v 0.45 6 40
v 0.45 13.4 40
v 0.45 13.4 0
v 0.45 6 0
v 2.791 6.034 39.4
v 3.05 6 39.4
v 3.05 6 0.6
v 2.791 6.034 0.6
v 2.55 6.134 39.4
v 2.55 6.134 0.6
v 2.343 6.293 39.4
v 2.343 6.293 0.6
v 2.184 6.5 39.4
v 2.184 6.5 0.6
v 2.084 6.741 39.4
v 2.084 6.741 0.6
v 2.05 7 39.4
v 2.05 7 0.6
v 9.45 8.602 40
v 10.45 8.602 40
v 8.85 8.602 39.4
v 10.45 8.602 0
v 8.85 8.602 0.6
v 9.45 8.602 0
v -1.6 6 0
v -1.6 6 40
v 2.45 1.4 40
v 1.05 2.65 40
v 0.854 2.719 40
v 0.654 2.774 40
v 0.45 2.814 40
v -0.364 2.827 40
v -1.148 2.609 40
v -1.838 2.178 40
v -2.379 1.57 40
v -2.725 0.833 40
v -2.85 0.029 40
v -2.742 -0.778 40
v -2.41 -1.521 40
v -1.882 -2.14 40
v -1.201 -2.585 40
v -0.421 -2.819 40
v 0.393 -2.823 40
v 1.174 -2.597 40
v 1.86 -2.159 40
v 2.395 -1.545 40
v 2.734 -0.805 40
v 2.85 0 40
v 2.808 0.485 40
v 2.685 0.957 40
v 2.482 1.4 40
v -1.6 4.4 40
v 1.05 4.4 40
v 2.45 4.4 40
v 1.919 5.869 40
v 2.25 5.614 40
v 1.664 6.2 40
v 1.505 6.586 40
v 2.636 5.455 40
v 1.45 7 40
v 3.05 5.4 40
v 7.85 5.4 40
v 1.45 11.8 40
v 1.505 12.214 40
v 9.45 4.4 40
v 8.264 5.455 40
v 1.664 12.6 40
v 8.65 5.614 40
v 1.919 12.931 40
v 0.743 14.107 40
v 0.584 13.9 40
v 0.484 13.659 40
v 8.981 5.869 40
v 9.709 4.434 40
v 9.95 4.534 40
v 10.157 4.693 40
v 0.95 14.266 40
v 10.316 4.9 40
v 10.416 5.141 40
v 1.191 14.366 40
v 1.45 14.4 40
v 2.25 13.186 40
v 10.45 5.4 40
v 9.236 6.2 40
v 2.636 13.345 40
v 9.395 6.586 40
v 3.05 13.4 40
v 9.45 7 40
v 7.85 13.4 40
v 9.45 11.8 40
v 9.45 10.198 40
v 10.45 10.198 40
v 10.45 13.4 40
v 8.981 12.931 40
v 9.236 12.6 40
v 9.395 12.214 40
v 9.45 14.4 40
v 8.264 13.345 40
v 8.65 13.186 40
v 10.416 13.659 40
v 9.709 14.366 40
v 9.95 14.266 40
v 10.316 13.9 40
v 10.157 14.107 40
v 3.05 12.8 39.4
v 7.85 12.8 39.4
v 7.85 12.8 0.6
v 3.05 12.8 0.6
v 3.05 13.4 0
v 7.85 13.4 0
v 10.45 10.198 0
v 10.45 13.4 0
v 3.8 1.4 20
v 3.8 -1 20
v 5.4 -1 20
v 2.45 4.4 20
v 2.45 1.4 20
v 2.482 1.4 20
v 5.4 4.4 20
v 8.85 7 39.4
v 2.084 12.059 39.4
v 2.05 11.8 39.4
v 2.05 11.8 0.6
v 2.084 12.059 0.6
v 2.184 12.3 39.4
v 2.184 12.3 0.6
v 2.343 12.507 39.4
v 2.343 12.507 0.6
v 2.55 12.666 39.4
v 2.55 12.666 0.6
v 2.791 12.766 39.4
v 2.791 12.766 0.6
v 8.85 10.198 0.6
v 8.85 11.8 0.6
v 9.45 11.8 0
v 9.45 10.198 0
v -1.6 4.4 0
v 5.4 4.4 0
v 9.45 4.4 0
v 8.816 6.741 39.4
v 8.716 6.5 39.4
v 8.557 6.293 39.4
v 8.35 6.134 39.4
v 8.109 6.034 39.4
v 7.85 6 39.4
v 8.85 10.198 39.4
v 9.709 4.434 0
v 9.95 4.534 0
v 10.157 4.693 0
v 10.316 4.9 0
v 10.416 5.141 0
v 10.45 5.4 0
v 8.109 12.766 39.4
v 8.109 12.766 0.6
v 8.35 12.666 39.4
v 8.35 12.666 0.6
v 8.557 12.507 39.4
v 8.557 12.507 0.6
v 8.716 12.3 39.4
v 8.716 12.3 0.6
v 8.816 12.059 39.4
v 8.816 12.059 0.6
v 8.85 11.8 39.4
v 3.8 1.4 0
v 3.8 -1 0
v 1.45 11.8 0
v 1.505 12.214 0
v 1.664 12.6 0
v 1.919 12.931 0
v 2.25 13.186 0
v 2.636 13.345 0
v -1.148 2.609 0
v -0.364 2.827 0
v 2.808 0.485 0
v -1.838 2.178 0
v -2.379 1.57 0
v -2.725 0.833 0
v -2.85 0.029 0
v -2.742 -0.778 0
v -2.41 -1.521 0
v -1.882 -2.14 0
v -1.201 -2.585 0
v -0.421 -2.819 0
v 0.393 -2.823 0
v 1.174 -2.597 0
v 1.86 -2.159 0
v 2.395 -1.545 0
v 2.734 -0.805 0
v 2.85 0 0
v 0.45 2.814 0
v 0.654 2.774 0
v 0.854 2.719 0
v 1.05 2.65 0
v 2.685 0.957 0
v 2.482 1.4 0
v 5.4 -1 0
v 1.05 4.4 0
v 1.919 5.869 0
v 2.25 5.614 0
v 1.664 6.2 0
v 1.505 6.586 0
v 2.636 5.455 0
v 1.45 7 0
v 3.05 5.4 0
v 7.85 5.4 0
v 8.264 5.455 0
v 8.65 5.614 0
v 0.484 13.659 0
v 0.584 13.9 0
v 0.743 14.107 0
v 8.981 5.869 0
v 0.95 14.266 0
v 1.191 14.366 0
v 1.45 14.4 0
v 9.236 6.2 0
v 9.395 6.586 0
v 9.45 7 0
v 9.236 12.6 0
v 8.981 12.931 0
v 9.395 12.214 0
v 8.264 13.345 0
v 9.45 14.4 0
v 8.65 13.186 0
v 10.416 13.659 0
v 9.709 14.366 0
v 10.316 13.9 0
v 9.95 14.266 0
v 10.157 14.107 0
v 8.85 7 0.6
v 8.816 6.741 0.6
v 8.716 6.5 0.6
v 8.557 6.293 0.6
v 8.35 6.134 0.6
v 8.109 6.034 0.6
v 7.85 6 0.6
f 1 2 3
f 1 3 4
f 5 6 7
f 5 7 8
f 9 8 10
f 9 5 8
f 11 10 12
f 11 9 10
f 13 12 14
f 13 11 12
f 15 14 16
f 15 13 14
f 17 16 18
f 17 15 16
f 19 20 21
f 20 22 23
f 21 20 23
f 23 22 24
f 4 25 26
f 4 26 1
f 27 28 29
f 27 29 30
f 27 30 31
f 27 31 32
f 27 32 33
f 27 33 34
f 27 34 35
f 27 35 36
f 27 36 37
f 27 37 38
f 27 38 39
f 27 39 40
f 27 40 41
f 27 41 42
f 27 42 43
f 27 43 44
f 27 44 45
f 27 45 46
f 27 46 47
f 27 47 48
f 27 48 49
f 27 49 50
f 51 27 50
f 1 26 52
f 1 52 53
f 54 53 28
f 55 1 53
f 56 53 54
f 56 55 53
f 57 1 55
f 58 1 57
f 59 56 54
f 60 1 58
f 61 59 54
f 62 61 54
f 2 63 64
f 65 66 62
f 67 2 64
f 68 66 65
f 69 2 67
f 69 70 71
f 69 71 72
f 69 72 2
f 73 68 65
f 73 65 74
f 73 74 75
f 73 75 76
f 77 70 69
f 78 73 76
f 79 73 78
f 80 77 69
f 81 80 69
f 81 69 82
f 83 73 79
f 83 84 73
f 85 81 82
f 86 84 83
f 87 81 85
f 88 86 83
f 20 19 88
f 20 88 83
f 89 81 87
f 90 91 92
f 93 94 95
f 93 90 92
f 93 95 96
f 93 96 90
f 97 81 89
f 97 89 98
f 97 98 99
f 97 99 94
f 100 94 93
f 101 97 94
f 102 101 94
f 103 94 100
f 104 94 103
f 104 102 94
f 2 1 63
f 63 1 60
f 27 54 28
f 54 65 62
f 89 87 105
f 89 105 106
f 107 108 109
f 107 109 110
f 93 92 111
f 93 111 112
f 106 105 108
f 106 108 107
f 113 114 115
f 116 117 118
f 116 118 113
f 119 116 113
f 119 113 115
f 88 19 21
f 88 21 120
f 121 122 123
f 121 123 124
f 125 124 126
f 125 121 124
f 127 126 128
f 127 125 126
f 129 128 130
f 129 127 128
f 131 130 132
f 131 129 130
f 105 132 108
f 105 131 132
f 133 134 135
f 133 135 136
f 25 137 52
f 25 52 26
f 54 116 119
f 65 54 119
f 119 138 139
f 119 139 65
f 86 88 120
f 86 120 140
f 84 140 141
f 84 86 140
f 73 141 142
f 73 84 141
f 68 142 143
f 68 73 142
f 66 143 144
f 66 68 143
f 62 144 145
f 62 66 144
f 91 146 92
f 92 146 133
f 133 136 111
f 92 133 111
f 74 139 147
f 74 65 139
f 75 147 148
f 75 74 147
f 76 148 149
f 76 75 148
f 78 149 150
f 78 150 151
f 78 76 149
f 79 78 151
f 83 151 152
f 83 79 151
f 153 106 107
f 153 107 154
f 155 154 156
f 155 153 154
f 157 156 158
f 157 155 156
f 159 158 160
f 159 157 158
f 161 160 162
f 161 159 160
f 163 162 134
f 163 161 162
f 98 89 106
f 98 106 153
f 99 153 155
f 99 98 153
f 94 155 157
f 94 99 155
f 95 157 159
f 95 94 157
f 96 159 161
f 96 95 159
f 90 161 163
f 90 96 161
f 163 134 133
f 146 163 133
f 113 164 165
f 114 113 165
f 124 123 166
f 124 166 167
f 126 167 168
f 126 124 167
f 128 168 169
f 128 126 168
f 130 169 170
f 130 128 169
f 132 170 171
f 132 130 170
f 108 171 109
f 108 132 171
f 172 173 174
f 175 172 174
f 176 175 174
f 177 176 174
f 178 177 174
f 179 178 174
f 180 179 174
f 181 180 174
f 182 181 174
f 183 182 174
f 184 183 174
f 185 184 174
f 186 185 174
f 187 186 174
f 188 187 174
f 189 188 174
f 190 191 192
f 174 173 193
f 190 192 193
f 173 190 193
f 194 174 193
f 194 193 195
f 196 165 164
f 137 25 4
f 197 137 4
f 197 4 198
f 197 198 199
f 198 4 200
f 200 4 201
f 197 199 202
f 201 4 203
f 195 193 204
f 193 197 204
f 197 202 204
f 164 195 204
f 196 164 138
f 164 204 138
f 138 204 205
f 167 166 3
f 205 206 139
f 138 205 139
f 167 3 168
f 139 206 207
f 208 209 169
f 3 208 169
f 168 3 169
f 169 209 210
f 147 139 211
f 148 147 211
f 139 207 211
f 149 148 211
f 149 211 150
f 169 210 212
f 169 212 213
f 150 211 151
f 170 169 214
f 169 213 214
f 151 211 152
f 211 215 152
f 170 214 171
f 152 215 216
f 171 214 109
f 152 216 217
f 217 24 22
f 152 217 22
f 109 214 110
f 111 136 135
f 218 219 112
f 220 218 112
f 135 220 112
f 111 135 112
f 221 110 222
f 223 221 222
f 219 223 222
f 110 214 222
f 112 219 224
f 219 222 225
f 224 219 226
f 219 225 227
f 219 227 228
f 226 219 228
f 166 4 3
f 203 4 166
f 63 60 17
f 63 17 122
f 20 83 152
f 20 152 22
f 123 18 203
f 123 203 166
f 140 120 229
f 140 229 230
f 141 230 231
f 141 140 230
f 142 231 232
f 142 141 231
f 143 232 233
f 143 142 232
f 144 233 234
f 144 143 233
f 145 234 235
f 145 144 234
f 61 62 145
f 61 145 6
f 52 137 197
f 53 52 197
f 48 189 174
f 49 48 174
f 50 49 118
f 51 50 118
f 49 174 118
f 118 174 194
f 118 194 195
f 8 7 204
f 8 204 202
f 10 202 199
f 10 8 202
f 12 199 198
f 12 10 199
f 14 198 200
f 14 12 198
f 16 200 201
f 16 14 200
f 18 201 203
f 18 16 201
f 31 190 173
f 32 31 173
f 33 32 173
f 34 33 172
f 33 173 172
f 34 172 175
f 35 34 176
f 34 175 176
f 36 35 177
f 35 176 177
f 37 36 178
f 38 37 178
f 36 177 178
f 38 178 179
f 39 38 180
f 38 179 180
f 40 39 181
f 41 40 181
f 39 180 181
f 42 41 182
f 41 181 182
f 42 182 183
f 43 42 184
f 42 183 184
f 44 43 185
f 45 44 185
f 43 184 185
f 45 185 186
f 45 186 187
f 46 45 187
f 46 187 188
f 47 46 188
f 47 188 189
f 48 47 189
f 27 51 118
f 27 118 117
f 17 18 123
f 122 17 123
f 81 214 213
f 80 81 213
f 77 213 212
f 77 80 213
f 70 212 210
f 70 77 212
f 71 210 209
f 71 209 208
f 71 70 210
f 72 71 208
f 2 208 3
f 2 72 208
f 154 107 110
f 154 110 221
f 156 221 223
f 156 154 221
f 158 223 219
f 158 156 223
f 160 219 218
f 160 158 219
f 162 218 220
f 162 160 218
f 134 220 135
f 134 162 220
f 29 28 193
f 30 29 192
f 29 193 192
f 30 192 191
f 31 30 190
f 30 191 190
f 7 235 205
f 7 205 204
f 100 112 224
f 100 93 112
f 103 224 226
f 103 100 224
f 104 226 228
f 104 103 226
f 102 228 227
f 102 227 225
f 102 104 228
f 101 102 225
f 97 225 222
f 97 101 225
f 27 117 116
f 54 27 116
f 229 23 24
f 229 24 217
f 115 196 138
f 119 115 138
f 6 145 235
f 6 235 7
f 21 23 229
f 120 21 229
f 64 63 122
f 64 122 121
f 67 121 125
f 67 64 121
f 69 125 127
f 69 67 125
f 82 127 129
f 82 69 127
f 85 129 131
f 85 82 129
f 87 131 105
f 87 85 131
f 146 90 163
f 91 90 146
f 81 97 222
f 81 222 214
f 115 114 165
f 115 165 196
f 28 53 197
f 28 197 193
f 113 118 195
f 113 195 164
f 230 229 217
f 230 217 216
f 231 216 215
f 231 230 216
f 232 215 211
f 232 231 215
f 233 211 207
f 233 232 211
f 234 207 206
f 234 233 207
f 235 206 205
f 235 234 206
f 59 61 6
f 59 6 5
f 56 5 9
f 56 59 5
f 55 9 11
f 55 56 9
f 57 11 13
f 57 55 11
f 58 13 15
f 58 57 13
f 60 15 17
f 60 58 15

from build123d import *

# Parameters (mm, degrees)
F0_W     = 2.05
F0_H     = 1.6
F1_DEPTH = 40
F2_DEPTH = 20
F3_R     = 1
F4_SIZE  = 0.6


with BuildPart() as f1:
    # F0 (on Top) → F1 (new body)
    with BuildSketch(Plane.XY):
        Polygon((0.45, 6), (0.45, 4.4), (1.05, 4.4), (2.45, 4.4), (3.8, 4.4), (5.4, 4.4), (10.45, 4.4), (10.45, 8.6023478262), (8.85, 8.6023478262), (8.85, 6), (2.05, 6), (2.05, 12.8), (8.85, 12.8), (8.85, 10.1976521738), (10.45, 10.1976521738), (10.45, 14.4), (0.45, 14.4), align=None)
        with BuildLine():
            Line((2.45, 1.4), (2.45, 1.4560219779))
            ThreePointArc((2.45, 1.4560219779), (1.8489495156, 2.168844321), (1.05, 2.6495282599))
            Line((1.05, 2.6495282599), (0.45, 2.6495282599))
            Line((0.45, 2.6495282599), (0.45, 0))
            Line((0.45, 0), (2.45, 0))
            Line((2.45, 0), (2.45, 1.4))
        make_face()
        with BuildLine():
            ThreePointArc((0.45, 2.8142494559), (-2.1685248442, -1.8493242009), (2.85, 0))
            ThreePointArc((2.85, 0), (2.756578423, 0.723723288), (2.4824383175, 1.4))
            Line((2.4824383175, 1.4), (2.45, 1.4))
            Line((2.45, 1.4), (2.45, 0))
            Line((2.45, 0), (0.45, 0))
            Line((0.45, 0), (0.45, 2.6495282599))
            Line((0.45, 2.6495282599), (0.45, 2.8142494559))
        make_face()
        with BuildLine():
            ThreePointArc((1.05, 2.6495282599), (1.8489495156, 2.168844321), (2.45, 1.4560219779))
            Line((2.45, 1.4560219779), (2.45, 4.4))
            Line((2.45, 4.4), (1.05, 4.4))
            Line((1.05, 4.4), (1.05, 2.6495282599))
        make_face()
        with BuildLine():
            ThreePointArc((1.05, 2.6495282599), (0.7545086269, 2.7483116148), (0.45, 2.8142494559))
            Line((0.45, 2.8142494559), (0.45, 2.6495282599))
            Line((0.45, 2.6495282599), (1.05, 2.6495282599))
        make_face()
        with Locations((-0.575, 5.2)):
            Rectangle(F0_W, F0_H)
    extrude(amount=F1_DEPTH)

    # F0 (on Top) → F2 (join)
    with BuildSketch(Plane.XY):
        Polygon((3.8, 4.4), (3.8, 1.4), (3.8, -1), (5.4, -1), (5.4, 4.4), align=None)
        with BuildLine():
            Line((2.45, 1.4), (2.4824383175, 1.4))
            ThreePointArc((2.4824383175, 1.4), (2.4663782261, 1.4281030935), (2.45, 1.4560219779))
            Line((2.45, 1.4560219779), (2.45, 1.4))
        make_face()
        with BuildLine():
            ThreePointArc((2.45, 1.4560219779), (2.4663782261, 1.4281030935), (2.4824383175, 1.4))
            Line((2.4824383175, 1.4), (3.8, 1.4))
            Line((3.8, 1.4), (3.8, 4.4))
            Line((3.8, 4.4), (2.45, 4.4))
            Line((2.45, 4.4), (2.45, 1.4560219779))
        make_face()
    extrude(amount=F2_DEPTH)

    # F3
    f3_edges = [f1.edges().sort_by_distance(p)[0] for p in [
        (10.45, 14.4, 20),
        (0.45, 14.4, 20),
        (10.45, 4.4, 20),
        (2.05, 12.8, 20),
        (8.85, 12.8, 20),
        (8.85, 6, 20),
        (2.05, 6, 20),
    ]]
    fillet(f3_edges, radius=F3_R)

    # F4
    f4_edges = [f1.edges().sort_by_distance(p)[0] for p in [
        (2.05, 9.4, 40),
        (5.45, 6, 0),
    ]]
    chamfer(f4_edges, length=F4_SIZE)


solid = f1.part
